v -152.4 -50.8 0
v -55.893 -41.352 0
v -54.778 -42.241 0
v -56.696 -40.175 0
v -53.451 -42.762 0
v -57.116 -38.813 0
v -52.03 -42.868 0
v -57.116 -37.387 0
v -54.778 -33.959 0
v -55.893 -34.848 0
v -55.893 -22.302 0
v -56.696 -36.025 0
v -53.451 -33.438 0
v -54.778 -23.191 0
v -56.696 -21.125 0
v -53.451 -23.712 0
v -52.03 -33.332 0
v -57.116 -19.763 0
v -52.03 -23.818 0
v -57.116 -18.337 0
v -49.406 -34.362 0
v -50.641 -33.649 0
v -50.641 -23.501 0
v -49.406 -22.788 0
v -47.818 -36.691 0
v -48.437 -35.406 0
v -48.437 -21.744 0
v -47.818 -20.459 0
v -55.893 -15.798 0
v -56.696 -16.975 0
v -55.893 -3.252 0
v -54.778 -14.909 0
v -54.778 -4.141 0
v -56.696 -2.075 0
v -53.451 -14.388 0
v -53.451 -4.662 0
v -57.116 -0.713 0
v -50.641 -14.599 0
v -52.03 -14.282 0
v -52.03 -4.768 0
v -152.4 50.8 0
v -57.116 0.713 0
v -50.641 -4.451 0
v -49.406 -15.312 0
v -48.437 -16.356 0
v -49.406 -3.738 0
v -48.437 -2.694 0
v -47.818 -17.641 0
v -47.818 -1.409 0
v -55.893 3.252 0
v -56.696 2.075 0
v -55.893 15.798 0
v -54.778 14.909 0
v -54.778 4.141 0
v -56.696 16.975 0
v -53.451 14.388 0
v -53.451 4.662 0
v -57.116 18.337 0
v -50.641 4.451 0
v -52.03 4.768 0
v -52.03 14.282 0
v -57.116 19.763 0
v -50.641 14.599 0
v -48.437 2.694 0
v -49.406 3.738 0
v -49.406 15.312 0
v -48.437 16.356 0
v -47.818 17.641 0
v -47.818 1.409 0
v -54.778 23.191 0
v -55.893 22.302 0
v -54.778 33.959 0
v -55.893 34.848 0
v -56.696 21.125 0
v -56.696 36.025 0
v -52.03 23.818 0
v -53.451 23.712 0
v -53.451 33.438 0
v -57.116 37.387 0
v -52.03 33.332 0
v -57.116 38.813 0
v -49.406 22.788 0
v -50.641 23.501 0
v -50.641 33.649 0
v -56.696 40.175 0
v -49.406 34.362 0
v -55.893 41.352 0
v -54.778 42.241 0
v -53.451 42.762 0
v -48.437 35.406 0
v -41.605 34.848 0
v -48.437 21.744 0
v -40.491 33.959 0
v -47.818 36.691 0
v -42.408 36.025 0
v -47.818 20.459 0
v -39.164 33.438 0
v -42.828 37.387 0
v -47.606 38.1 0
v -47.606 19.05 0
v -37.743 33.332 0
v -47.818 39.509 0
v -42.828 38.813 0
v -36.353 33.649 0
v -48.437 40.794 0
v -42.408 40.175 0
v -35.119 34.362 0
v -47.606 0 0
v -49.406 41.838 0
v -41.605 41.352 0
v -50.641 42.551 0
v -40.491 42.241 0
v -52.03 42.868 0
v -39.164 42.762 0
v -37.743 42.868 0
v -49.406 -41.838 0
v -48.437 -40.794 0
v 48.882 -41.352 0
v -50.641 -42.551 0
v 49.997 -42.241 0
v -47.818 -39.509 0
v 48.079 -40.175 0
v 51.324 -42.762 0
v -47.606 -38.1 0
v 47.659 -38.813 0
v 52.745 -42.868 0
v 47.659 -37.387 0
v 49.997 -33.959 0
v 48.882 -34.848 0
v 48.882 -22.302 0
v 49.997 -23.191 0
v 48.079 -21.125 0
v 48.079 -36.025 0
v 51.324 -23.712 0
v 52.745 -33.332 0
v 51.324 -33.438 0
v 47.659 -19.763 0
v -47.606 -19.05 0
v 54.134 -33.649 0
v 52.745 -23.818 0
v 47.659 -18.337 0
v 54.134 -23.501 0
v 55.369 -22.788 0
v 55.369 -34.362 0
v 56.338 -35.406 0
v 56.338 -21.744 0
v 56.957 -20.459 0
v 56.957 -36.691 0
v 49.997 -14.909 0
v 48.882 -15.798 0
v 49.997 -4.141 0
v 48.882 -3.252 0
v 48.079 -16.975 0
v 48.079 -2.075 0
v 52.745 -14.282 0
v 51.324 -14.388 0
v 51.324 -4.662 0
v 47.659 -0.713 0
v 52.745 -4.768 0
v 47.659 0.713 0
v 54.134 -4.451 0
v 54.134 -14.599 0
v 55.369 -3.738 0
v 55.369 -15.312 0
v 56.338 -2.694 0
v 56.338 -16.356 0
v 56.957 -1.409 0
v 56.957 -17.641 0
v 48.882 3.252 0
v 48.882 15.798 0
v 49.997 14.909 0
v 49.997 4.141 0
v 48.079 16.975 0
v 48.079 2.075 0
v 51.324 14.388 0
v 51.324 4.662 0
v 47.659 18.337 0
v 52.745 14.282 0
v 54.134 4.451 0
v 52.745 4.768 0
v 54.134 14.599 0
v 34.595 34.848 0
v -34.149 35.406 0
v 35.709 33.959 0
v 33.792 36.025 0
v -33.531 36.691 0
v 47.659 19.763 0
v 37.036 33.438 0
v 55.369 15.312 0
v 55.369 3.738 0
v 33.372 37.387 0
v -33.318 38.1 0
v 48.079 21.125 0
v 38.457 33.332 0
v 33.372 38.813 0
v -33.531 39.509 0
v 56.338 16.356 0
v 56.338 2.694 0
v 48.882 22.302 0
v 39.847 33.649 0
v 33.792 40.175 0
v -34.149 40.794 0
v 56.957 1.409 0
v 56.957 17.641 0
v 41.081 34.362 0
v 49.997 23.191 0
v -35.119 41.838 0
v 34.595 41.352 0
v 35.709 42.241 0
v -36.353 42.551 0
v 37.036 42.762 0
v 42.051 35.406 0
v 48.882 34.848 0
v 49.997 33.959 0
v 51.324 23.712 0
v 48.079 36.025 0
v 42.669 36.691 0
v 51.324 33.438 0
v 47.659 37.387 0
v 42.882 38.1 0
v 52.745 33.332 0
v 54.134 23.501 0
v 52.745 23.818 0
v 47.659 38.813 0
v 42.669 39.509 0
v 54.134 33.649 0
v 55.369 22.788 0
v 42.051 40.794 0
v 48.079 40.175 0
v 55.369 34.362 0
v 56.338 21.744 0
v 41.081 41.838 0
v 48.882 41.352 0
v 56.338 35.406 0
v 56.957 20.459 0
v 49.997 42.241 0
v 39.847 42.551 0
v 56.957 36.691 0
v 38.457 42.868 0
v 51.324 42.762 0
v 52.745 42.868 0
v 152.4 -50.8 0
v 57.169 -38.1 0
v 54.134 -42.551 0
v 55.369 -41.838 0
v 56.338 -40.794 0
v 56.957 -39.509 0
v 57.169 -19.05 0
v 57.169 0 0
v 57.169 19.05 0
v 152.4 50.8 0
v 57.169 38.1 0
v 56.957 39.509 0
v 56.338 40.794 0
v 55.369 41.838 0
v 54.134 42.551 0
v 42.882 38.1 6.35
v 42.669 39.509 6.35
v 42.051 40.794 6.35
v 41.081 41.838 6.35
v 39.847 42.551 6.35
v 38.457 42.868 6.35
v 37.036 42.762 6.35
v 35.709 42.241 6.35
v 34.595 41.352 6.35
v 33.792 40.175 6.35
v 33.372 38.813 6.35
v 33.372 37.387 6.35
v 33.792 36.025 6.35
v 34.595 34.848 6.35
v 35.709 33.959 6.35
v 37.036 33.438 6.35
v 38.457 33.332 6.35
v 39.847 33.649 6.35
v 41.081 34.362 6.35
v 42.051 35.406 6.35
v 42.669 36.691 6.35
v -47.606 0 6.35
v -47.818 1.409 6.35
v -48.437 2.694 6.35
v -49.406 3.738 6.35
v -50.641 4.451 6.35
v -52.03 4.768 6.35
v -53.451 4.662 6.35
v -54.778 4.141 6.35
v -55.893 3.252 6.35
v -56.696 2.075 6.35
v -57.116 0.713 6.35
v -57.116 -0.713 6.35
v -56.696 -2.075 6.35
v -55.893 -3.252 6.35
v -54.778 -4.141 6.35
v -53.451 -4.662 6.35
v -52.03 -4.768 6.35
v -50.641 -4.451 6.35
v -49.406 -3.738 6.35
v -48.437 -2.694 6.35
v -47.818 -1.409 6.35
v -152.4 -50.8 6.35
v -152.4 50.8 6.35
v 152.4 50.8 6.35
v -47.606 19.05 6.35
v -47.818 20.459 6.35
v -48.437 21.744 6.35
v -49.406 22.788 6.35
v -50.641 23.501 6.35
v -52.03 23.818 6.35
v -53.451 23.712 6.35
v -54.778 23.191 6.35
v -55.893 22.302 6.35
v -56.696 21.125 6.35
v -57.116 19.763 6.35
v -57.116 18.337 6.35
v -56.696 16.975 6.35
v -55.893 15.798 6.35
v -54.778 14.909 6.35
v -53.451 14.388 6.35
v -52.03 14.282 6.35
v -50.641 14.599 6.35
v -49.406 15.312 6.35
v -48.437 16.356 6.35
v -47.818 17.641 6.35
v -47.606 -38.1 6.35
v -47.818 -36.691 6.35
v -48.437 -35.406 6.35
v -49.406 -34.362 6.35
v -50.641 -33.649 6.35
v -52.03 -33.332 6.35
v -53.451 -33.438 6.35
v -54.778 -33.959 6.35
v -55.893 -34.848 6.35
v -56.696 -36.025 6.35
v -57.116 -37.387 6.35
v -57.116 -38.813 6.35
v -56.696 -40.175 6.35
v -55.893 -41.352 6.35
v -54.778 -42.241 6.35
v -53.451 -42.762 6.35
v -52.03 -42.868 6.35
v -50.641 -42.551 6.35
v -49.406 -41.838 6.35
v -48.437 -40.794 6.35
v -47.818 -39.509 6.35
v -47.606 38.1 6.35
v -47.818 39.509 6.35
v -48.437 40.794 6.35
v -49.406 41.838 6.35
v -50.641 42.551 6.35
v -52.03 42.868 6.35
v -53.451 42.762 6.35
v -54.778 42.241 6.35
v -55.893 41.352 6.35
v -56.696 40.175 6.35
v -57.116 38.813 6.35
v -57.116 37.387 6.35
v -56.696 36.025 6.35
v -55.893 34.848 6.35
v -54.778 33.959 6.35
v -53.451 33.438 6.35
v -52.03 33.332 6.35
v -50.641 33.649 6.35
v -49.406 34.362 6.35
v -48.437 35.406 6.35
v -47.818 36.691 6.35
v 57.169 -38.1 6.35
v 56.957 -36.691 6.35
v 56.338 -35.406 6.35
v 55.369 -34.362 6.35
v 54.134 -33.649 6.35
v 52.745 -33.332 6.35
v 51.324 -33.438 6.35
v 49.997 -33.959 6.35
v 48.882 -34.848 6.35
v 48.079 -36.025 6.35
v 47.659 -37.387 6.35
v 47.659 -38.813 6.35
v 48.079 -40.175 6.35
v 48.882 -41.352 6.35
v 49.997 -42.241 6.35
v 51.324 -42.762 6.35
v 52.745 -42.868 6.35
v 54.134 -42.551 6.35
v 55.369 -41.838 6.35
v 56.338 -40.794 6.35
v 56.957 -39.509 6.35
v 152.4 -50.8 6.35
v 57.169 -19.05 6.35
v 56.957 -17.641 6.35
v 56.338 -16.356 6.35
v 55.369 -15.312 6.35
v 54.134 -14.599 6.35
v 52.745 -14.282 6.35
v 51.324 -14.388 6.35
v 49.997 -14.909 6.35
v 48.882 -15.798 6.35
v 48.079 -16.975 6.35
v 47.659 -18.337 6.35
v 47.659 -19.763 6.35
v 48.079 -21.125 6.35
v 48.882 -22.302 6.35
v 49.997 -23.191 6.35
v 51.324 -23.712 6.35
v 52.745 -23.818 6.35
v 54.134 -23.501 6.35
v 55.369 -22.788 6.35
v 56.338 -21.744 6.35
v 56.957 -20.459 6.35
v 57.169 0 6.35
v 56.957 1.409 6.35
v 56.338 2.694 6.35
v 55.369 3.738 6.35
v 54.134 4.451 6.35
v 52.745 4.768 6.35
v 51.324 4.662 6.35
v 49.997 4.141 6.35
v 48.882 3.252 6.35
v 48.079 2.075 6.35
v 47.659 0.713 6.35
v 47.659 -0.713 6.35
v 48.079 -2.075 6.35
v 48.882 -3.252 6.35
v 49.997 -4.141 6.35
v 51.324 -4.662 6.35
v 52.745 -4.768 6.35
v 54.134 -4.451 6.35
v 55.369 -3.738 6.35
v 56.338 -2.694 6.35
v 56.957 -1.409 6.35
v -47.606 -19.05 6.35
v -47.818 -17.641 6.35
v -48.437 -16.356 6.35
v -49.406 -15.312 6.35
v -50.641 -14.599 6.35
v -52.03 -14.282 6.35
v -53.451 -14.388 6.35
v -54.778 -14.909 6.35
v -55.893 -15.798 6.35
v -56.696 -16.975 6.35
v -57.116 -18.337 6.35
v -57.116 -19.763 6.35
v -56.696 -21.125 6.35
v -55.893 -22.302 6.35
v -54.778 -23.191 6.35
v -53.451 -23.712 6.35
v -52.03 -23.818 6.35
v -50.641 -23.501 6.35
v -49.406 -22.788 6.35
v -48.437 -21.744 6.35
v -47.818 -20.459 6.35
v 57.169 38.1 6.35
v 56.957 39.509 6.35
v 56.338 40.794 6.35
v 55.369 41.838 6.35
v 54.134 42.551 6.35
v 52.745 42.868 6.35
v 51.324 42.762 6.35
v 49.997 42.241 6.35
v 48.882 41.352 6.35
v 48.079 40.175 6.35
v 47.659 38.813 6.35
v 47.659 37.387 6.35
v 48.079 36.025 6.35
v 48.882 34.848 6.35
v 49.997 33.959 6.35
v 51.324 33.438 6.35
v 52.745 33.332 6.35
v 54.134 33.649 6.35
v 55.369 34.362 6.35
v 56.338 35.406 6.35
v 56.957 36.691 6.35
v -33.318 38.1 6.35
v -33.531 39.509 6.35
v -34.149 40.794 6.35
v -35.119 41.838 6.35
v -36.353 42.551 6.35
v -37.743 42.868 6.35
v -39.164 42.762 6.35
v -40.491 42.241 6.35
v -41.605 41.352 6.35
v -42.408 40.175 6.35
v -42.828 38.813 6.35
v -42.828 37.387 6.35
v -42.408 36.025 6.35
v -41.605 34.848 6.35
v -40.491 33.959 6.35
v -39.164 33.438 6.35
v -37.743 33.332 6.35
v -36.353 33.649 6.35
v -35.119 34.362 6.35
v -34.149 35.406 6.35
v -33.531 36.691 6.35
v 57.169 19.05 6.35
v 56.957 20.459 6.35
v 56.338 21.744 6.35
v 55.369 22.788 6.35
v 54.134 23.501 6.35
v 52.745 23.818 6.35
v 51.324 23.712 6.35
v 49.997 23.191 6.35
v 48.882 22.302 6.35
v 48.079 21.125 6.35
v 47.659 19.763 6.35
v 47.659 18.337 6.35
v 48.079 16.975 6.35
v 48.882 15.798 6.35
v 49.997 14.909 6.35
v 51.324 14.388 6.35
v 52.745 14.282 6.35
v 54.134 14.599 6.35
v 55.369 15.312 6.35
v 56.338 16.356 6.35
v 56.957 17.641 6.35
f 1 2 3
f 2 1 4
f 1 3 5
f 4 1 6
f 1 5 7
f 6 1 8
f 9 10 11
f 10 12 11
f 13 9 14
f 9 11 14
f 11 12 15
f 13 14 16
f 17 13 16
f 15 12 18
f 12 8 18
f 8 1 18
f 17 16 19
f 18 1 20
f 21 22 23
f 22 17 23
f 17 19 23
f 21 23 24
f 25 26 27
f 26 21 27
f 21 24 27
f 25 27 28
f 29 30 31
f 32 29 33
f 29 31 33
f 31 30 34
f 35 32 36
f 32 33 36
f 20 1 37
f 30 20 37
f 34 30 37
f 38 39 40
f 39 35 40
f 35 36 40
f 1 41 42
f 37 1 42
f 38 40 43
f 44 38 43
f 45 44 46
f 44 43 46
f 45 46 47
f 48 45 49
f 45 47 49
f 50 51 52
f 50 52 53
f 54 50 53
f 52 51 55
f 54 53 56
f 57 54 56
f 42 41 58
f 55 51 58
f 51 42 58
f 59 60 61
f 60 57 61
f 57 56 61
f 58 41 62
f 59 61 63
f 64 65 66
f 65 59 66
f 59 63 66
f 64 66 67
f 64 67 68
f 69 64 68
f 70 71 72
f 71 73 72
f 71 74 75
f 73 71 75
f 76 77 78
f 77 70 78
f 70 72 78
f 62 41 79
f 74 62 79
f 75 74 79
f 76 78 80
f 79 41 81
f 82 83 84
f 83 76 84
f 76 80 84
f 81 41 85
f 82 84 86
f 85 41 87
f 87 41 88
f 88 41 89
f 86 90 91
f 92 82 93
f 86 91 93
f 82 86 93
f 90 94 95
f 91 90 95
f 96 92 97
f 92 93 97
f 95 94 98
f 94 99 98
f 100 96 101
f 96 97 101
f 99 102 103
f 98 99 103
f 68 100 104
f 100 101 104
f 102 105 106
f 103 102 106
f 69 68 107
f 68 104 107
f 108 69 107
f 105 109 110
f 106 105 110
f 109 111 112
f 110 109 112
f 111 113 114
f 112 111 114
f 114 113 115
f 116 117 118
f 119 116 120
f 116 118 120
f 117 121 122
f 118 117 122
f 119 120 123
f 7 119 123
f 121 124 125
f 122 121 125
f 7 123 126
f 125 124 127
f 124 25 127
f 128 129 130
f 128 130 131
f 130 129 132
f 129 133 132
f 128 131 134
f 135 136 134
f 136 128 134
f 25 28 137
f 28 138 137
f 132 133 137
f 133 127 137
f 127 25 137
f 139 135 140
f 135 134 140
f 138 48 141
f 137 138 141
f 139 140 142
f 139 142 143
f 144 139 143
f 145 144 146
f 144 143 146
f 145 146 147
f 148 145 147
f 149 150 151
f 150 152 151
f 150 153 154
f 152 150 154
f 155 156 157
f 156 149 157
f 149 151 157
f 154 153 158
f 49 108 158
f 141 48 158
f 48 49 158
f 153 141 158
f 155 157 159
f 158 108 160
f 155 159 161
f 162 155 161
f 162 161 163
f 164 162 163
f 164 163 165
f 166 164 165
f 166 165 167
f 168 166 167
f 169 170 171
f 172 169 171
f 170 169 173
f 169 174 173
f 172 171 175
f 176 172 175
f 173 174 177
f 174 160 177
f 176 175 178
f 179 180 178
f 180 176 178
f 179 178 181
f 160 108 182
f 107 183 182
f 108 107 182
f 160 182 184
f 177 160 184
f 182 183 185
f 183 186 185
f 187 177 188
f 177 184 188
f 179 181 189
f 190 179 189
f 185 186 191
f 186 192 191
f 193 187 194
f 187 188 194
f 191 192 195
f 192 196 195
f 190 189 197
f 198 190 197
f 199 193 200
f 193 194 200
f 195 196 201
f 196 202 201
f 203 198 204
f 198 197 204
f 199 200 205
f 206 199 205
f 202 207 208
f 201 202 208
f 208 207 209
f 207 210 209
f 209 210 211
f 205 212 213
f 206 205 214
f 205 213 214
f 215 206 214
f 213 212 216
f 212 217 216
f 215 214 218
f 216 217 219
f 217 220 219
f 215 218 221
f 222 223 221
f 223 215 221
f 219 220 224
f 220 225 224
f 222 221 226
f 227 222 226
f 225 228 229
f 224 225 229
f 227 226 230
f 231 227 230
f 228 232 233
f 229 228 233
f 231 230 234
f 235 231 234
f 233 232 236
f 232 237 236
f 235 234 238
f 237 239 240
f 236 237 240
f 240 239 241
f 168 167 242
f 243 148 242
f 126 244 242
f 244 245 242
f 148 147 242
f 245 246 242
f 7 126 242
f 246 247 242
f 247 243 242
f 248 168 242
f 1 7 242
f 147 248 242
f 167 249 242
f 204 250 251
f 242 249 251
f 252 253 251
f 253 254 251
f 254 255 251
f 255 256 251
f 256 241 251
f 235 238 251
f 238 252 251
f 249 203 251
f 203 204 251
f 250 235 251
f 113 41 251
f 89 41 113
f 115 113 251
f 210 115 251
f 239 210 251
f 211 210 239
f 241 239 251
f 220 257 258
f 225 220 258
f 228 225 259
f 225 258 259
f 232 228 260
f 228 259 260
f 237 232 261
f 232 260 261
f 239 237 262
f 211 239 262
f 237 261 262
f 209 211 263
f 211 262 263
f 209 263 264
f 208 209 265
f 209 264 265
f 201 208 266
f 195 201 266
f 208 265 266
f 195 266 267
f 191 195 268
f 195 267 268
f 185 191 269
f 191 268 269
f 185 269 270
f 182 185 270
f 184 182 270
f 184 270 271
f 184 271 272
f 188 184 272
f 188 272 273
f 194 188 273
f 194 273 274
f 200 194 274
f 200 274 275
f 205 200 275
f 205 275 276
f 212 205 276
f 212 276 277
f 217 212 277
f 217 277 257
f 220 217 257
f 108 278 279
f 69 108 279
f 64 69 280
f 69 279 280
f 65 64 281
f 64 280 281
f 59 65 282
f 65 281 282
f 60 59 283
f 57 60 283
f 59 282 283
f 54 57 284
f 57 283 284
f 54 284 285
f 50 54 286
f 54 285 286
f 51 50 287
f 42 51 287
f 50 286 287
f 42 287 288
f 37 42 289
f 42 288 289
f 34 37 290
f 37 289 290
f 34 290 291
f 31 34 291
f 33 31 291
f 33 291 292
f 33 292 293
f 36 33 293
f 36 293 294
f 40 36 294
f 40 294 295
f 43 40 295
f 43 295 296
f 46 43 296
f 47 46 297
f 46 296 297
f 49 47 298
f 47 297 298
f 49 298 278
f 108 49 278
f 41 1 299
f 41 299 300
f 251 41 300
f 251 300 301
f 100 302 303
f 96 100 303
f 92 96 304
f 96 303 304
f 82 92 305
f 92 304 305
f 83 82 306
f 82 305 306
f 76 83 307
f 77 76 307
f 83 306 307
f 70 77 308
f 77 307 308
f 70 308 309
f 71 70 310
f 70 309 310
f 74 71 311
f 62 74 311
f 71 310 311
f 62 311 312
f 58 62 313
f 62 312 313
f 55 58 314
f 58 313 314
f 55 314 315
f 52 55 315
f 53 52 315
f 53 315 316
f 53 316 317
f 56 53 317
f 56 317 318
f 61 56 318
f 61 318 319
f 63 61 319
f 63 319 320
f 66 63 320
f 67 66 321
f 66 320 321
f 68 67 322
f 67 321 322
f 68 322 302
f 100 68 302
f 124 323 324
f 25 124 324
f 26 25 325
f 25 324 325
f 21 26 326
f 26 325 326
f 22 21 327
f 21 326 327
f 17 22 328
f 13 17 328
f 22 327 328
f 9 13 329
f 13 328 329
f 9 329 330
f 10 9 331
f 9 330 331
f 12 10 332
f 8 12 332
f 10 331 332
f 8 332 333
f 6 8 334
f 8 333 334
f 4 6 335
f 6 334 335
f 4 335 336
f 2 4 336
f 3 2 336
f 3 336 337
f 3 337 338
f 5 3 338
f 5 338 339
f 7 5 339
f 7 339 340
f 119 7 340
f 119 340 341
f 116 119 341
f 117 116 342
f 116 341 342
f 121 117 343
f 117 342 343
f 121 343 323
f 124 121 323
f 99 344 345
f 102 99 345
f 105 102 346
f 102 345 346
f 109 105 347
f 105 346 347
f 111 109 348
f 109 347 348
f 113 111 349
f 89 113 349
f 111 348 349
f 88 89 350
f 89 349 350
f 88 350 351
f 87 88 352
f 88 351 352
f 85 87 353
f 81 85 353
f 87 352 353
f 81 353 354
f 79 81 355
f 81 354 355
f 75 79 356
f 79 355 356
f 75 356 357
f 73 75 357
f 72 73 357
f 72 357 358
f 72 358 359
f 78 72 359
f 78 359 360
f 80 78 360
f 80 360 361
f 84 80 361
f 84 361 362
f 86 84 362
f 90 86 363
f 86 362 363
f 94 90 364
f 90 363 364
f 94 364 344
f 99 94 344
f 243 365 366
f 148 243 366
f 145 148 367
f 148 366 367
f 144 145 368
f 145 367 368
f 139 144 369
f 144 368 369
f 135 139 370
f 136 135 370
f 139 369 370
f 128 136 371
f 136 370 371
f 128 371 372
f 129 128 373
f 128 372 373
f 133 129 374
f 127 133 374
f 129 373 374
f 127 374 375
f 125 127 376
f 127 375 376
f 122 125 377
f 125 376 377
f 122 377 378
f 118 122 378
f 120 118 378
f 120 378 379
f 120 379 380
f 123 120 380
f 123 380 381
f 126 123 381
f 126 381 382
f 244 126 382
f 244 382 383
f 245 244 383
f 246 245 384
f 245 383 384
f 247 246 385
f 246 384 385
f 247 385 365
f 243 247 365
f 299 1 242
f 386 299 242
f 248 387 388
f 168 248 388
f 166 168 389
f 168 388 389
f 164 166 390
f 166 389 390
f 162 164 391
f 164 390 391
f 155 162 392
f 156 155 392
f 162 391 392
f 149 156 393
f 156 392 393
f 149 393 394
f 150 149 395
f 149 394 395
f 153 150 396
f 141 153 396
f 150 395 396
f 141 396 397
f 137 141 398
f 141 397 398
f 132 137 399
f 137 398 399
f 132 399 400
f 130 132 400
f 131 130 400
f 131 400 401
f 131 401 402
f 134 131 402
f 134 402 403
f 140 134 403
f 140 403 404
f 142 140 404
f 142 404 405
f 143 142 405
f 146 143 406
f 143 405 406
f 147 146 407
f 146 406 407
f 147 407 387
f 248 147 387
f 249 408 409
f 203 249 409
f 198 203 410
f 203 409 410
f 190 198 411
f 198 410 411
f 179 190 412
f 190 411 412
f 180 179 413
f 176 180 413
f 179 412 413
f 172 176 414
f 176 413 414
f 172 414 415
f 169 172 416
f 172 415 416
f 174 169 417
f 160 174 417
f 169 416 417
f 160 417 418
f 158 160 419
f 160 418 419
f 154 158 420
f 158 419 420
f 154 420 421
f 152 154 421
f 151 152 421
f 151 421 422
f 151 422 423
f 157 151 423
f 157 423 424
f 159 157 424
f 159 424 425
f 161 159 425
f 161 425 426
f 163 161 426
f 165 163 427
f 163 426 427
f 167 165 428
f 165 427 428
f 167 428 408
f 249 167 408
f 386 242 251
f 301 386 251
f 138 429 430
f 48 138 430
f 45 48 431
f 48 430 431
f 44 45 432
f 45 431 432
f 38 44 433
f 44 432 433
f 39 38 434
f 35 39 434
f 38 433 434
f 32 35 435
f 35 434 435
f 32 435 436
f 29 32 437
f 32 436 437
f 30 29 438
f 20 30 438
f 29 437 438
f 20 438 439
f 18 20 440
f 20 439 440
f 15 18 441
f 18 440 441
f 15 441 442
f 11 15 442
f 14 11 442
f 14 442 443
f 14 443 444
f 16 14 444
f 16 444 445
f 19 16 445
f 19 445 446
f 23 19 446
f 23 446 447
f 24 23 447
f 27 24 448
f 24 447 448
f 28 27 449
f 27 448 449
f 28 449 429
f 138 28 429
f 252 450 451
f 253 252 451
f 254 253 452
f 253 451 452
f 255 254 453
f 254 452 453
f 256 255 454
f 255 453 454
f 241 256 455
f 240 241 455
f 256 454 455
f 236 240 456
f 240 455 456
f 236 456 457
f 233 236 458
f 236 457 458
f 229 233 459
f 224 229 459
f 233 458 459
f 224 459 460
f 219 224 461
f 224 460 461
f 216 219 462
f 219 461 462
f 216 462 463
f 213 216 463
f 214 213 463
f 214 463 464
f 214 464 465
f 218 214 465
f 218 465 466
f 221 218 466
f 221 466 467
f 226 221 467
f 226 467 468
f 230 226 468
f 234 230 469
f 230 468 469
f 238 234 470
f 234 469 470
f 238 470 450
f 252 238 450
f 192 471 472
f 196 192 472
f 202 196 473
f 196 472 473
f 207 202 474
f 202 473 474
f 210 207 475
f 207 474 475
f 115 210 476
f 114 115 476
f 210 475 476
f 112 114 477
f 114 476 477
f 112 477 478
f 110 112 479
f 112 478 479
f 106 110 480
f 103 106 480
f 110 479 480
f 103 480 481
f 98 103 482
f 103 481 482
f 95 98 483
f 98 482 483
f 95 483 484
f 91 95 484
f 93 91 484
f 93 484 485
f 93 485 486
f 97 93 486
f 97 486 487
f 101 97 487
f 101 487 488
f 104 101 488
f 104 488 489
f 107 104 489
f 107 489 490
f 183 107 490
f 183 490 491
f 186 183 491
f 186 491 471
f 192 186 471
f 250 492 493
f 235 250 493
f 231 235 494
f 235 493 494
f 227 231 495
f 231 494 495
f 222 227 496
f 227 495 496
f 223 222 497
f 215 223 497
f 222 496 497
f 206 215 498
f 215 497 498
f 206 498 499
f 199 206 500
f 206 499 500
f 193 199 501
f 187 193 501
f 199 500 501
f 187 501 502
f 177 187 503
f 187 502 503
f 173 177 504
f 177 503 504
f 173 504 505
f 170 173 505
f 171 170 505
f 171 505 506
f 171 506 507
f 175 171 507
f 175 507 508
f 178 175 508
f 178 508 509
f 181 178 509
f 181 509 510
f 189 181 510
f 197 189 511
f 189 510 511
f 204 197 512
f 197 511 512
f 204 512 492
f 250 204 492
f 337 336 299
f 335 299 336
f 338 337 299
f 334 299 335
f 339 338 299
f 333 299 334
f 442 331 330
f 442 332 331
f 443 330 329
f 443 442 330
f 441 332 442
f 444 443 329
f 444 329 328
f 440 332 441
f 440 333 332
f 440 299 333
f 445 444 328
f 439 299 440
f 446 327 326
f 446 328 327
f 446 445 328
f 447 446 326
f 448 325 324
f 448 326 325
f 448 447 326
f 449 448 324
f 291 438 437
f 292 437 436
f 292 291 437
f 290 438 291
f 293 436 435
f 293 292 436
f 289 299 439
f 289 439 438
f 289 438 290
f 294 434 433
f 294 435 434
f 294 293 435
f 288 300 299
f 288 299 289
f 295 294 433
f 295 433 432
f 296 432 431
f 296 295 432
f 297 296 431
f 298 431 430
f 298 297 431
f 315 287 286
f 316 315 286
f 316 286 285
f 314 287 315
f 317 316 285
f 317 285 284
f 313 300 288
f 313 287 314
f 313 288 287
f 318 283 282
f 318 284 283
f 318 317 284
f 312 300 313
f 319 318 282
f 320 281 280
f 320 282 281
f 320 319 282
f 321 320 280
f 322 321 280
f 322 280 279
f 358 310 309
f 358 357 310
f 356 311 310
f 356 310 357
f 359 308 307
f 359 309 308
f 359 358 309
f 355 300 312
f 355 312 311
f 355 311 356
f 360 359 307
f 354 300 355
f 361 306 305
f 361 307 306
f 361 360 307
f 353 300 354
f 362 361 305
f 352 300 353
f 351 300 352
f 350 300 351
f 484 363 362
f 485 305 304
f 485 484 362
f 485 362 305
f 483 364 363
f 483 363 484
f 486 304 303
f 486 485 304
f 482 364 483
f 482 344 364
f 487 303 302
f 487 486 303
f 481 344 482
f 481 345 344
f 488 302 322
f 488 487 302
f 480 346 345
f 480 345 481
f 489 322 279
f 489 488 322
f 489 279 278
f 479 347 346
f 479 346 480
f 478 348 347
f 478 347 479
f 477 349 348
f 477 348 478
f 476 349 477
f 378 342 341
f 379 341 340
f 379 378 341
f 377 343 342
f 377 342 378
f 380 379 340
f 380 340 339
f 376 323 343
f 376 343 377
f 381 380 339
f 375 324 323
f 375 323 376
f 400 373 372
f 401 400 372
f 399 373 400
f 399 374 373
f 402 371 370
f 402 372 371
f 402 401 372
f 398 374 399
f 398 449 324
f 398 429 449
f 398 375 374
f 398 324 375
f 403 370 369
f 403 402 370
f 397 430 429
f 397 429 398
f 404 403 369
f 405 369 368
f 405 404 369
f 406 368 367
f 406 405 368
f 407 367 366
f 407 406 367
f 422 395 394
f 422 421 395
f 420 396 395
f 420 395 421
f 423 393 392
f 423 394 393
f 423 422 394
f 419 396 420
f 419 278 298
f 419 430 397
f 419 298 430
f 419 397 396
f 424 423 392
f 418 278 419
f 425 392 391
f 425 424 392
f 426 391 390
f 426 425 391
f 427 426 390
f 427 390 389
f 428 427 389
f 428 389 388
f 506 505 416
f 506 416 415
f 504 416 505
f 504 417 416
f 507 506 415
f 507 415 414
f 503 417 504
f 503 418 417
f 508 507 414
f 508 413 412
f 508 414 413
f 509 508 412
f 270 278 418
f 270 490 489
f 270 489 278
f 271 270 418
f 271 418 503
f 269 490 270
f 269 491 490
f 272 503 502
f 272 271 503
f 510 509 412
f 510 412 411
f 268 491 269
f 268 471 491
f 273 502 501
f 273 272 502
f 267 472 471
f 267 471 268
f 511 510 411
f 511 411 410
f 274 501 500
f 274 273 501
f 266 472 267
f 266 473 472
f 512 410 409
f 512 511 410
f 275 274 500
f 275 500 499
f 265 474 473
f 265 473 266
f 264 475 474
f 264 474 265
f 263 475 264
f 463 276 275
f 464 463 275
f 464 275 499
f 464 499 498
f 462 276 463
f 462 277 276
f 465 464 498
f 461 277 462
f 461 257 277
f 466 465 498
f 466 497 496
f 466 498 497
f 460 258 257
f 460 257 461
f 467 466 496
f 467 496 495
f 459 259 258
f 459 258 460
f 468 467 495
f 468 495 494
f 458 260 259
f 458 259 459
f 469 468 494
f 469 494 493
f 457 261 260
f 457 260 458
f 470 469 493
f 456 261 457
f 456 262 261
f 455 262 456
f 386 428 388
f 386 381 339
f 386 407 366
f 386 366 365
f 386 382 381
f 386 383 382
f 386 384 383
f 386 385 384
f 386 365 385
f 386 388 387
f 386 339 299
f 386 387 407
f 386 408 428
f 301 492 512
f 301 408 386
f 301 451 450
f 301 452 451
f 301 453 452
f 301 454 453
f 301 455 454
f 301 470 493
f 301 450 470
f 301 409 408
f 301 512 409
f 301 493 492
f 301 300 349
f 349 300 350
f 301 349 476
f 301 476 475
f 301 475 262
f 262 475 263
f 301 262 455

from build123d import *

# Parameters (mm, degrees)
F0_W     = 304.8
F0_H     = 101.6
F1_DEPTH = 6.35
F2_R     = 4.78155
F3_DEPTH = 6.35
F4_R     = 4.78155
F5_DEPTH = 6.351


# Not quite as in the source:
# - a feature names something its author has since deleted; it is built from what else it names


with BuildPart() as f1:
    # F0 (on Top) → F1 (new body)
    with BuildSketch(Plane.XY):
        Rectangle(F0_W, F0_H)
    extrude(amount=F1_DEPTH)

    # F2 (on face) → F3 (cut, through all)
    with BuildSketch(Plane.XY.offset(6.35)):
        with Locations((-52.3875, 38.1)):
            Circle(F2_R)
        with Locations((52.3875, 38.1)):
            Circle(F2_R)
        with Locations((-52.3875, 19.05)):
            Circle(F2_R)
        with Locations((52.3875, 19.05)):
            Circle(F2_R)
        with Locations((-52.3875, 0)):
            Circle(F2_R)
        with Locations((-52.3875, -19.05)):
            Circle(F2_R)
        with Locations((-52.3875, -38.1)):
            Circle(F2_R)
        with Locations((52.3875, 0)):
            Circle(F2_R)
        with Locations((52.3875, -19.05)):
            Circle(F2_R)
        with Locations((52.3875, -38.1)):
            Circle(F2_R)
    extrude(amount=-F3_DEPTH, mode=Mode.SUBTRACT)

    # F4 (on face) → F5 (cut, through all)
    with BuildSketch(Plane.XY.offset(6.35)):
        with Locations((-38.1, 38.1)):
            Circle(F4_R)
        with Locations((38.1, 38.1)):
            Circle(F4_R)
    extrude(amount=-F5_DEPTH, mode=Mode.SUBTRACT)


solid = f1.part
